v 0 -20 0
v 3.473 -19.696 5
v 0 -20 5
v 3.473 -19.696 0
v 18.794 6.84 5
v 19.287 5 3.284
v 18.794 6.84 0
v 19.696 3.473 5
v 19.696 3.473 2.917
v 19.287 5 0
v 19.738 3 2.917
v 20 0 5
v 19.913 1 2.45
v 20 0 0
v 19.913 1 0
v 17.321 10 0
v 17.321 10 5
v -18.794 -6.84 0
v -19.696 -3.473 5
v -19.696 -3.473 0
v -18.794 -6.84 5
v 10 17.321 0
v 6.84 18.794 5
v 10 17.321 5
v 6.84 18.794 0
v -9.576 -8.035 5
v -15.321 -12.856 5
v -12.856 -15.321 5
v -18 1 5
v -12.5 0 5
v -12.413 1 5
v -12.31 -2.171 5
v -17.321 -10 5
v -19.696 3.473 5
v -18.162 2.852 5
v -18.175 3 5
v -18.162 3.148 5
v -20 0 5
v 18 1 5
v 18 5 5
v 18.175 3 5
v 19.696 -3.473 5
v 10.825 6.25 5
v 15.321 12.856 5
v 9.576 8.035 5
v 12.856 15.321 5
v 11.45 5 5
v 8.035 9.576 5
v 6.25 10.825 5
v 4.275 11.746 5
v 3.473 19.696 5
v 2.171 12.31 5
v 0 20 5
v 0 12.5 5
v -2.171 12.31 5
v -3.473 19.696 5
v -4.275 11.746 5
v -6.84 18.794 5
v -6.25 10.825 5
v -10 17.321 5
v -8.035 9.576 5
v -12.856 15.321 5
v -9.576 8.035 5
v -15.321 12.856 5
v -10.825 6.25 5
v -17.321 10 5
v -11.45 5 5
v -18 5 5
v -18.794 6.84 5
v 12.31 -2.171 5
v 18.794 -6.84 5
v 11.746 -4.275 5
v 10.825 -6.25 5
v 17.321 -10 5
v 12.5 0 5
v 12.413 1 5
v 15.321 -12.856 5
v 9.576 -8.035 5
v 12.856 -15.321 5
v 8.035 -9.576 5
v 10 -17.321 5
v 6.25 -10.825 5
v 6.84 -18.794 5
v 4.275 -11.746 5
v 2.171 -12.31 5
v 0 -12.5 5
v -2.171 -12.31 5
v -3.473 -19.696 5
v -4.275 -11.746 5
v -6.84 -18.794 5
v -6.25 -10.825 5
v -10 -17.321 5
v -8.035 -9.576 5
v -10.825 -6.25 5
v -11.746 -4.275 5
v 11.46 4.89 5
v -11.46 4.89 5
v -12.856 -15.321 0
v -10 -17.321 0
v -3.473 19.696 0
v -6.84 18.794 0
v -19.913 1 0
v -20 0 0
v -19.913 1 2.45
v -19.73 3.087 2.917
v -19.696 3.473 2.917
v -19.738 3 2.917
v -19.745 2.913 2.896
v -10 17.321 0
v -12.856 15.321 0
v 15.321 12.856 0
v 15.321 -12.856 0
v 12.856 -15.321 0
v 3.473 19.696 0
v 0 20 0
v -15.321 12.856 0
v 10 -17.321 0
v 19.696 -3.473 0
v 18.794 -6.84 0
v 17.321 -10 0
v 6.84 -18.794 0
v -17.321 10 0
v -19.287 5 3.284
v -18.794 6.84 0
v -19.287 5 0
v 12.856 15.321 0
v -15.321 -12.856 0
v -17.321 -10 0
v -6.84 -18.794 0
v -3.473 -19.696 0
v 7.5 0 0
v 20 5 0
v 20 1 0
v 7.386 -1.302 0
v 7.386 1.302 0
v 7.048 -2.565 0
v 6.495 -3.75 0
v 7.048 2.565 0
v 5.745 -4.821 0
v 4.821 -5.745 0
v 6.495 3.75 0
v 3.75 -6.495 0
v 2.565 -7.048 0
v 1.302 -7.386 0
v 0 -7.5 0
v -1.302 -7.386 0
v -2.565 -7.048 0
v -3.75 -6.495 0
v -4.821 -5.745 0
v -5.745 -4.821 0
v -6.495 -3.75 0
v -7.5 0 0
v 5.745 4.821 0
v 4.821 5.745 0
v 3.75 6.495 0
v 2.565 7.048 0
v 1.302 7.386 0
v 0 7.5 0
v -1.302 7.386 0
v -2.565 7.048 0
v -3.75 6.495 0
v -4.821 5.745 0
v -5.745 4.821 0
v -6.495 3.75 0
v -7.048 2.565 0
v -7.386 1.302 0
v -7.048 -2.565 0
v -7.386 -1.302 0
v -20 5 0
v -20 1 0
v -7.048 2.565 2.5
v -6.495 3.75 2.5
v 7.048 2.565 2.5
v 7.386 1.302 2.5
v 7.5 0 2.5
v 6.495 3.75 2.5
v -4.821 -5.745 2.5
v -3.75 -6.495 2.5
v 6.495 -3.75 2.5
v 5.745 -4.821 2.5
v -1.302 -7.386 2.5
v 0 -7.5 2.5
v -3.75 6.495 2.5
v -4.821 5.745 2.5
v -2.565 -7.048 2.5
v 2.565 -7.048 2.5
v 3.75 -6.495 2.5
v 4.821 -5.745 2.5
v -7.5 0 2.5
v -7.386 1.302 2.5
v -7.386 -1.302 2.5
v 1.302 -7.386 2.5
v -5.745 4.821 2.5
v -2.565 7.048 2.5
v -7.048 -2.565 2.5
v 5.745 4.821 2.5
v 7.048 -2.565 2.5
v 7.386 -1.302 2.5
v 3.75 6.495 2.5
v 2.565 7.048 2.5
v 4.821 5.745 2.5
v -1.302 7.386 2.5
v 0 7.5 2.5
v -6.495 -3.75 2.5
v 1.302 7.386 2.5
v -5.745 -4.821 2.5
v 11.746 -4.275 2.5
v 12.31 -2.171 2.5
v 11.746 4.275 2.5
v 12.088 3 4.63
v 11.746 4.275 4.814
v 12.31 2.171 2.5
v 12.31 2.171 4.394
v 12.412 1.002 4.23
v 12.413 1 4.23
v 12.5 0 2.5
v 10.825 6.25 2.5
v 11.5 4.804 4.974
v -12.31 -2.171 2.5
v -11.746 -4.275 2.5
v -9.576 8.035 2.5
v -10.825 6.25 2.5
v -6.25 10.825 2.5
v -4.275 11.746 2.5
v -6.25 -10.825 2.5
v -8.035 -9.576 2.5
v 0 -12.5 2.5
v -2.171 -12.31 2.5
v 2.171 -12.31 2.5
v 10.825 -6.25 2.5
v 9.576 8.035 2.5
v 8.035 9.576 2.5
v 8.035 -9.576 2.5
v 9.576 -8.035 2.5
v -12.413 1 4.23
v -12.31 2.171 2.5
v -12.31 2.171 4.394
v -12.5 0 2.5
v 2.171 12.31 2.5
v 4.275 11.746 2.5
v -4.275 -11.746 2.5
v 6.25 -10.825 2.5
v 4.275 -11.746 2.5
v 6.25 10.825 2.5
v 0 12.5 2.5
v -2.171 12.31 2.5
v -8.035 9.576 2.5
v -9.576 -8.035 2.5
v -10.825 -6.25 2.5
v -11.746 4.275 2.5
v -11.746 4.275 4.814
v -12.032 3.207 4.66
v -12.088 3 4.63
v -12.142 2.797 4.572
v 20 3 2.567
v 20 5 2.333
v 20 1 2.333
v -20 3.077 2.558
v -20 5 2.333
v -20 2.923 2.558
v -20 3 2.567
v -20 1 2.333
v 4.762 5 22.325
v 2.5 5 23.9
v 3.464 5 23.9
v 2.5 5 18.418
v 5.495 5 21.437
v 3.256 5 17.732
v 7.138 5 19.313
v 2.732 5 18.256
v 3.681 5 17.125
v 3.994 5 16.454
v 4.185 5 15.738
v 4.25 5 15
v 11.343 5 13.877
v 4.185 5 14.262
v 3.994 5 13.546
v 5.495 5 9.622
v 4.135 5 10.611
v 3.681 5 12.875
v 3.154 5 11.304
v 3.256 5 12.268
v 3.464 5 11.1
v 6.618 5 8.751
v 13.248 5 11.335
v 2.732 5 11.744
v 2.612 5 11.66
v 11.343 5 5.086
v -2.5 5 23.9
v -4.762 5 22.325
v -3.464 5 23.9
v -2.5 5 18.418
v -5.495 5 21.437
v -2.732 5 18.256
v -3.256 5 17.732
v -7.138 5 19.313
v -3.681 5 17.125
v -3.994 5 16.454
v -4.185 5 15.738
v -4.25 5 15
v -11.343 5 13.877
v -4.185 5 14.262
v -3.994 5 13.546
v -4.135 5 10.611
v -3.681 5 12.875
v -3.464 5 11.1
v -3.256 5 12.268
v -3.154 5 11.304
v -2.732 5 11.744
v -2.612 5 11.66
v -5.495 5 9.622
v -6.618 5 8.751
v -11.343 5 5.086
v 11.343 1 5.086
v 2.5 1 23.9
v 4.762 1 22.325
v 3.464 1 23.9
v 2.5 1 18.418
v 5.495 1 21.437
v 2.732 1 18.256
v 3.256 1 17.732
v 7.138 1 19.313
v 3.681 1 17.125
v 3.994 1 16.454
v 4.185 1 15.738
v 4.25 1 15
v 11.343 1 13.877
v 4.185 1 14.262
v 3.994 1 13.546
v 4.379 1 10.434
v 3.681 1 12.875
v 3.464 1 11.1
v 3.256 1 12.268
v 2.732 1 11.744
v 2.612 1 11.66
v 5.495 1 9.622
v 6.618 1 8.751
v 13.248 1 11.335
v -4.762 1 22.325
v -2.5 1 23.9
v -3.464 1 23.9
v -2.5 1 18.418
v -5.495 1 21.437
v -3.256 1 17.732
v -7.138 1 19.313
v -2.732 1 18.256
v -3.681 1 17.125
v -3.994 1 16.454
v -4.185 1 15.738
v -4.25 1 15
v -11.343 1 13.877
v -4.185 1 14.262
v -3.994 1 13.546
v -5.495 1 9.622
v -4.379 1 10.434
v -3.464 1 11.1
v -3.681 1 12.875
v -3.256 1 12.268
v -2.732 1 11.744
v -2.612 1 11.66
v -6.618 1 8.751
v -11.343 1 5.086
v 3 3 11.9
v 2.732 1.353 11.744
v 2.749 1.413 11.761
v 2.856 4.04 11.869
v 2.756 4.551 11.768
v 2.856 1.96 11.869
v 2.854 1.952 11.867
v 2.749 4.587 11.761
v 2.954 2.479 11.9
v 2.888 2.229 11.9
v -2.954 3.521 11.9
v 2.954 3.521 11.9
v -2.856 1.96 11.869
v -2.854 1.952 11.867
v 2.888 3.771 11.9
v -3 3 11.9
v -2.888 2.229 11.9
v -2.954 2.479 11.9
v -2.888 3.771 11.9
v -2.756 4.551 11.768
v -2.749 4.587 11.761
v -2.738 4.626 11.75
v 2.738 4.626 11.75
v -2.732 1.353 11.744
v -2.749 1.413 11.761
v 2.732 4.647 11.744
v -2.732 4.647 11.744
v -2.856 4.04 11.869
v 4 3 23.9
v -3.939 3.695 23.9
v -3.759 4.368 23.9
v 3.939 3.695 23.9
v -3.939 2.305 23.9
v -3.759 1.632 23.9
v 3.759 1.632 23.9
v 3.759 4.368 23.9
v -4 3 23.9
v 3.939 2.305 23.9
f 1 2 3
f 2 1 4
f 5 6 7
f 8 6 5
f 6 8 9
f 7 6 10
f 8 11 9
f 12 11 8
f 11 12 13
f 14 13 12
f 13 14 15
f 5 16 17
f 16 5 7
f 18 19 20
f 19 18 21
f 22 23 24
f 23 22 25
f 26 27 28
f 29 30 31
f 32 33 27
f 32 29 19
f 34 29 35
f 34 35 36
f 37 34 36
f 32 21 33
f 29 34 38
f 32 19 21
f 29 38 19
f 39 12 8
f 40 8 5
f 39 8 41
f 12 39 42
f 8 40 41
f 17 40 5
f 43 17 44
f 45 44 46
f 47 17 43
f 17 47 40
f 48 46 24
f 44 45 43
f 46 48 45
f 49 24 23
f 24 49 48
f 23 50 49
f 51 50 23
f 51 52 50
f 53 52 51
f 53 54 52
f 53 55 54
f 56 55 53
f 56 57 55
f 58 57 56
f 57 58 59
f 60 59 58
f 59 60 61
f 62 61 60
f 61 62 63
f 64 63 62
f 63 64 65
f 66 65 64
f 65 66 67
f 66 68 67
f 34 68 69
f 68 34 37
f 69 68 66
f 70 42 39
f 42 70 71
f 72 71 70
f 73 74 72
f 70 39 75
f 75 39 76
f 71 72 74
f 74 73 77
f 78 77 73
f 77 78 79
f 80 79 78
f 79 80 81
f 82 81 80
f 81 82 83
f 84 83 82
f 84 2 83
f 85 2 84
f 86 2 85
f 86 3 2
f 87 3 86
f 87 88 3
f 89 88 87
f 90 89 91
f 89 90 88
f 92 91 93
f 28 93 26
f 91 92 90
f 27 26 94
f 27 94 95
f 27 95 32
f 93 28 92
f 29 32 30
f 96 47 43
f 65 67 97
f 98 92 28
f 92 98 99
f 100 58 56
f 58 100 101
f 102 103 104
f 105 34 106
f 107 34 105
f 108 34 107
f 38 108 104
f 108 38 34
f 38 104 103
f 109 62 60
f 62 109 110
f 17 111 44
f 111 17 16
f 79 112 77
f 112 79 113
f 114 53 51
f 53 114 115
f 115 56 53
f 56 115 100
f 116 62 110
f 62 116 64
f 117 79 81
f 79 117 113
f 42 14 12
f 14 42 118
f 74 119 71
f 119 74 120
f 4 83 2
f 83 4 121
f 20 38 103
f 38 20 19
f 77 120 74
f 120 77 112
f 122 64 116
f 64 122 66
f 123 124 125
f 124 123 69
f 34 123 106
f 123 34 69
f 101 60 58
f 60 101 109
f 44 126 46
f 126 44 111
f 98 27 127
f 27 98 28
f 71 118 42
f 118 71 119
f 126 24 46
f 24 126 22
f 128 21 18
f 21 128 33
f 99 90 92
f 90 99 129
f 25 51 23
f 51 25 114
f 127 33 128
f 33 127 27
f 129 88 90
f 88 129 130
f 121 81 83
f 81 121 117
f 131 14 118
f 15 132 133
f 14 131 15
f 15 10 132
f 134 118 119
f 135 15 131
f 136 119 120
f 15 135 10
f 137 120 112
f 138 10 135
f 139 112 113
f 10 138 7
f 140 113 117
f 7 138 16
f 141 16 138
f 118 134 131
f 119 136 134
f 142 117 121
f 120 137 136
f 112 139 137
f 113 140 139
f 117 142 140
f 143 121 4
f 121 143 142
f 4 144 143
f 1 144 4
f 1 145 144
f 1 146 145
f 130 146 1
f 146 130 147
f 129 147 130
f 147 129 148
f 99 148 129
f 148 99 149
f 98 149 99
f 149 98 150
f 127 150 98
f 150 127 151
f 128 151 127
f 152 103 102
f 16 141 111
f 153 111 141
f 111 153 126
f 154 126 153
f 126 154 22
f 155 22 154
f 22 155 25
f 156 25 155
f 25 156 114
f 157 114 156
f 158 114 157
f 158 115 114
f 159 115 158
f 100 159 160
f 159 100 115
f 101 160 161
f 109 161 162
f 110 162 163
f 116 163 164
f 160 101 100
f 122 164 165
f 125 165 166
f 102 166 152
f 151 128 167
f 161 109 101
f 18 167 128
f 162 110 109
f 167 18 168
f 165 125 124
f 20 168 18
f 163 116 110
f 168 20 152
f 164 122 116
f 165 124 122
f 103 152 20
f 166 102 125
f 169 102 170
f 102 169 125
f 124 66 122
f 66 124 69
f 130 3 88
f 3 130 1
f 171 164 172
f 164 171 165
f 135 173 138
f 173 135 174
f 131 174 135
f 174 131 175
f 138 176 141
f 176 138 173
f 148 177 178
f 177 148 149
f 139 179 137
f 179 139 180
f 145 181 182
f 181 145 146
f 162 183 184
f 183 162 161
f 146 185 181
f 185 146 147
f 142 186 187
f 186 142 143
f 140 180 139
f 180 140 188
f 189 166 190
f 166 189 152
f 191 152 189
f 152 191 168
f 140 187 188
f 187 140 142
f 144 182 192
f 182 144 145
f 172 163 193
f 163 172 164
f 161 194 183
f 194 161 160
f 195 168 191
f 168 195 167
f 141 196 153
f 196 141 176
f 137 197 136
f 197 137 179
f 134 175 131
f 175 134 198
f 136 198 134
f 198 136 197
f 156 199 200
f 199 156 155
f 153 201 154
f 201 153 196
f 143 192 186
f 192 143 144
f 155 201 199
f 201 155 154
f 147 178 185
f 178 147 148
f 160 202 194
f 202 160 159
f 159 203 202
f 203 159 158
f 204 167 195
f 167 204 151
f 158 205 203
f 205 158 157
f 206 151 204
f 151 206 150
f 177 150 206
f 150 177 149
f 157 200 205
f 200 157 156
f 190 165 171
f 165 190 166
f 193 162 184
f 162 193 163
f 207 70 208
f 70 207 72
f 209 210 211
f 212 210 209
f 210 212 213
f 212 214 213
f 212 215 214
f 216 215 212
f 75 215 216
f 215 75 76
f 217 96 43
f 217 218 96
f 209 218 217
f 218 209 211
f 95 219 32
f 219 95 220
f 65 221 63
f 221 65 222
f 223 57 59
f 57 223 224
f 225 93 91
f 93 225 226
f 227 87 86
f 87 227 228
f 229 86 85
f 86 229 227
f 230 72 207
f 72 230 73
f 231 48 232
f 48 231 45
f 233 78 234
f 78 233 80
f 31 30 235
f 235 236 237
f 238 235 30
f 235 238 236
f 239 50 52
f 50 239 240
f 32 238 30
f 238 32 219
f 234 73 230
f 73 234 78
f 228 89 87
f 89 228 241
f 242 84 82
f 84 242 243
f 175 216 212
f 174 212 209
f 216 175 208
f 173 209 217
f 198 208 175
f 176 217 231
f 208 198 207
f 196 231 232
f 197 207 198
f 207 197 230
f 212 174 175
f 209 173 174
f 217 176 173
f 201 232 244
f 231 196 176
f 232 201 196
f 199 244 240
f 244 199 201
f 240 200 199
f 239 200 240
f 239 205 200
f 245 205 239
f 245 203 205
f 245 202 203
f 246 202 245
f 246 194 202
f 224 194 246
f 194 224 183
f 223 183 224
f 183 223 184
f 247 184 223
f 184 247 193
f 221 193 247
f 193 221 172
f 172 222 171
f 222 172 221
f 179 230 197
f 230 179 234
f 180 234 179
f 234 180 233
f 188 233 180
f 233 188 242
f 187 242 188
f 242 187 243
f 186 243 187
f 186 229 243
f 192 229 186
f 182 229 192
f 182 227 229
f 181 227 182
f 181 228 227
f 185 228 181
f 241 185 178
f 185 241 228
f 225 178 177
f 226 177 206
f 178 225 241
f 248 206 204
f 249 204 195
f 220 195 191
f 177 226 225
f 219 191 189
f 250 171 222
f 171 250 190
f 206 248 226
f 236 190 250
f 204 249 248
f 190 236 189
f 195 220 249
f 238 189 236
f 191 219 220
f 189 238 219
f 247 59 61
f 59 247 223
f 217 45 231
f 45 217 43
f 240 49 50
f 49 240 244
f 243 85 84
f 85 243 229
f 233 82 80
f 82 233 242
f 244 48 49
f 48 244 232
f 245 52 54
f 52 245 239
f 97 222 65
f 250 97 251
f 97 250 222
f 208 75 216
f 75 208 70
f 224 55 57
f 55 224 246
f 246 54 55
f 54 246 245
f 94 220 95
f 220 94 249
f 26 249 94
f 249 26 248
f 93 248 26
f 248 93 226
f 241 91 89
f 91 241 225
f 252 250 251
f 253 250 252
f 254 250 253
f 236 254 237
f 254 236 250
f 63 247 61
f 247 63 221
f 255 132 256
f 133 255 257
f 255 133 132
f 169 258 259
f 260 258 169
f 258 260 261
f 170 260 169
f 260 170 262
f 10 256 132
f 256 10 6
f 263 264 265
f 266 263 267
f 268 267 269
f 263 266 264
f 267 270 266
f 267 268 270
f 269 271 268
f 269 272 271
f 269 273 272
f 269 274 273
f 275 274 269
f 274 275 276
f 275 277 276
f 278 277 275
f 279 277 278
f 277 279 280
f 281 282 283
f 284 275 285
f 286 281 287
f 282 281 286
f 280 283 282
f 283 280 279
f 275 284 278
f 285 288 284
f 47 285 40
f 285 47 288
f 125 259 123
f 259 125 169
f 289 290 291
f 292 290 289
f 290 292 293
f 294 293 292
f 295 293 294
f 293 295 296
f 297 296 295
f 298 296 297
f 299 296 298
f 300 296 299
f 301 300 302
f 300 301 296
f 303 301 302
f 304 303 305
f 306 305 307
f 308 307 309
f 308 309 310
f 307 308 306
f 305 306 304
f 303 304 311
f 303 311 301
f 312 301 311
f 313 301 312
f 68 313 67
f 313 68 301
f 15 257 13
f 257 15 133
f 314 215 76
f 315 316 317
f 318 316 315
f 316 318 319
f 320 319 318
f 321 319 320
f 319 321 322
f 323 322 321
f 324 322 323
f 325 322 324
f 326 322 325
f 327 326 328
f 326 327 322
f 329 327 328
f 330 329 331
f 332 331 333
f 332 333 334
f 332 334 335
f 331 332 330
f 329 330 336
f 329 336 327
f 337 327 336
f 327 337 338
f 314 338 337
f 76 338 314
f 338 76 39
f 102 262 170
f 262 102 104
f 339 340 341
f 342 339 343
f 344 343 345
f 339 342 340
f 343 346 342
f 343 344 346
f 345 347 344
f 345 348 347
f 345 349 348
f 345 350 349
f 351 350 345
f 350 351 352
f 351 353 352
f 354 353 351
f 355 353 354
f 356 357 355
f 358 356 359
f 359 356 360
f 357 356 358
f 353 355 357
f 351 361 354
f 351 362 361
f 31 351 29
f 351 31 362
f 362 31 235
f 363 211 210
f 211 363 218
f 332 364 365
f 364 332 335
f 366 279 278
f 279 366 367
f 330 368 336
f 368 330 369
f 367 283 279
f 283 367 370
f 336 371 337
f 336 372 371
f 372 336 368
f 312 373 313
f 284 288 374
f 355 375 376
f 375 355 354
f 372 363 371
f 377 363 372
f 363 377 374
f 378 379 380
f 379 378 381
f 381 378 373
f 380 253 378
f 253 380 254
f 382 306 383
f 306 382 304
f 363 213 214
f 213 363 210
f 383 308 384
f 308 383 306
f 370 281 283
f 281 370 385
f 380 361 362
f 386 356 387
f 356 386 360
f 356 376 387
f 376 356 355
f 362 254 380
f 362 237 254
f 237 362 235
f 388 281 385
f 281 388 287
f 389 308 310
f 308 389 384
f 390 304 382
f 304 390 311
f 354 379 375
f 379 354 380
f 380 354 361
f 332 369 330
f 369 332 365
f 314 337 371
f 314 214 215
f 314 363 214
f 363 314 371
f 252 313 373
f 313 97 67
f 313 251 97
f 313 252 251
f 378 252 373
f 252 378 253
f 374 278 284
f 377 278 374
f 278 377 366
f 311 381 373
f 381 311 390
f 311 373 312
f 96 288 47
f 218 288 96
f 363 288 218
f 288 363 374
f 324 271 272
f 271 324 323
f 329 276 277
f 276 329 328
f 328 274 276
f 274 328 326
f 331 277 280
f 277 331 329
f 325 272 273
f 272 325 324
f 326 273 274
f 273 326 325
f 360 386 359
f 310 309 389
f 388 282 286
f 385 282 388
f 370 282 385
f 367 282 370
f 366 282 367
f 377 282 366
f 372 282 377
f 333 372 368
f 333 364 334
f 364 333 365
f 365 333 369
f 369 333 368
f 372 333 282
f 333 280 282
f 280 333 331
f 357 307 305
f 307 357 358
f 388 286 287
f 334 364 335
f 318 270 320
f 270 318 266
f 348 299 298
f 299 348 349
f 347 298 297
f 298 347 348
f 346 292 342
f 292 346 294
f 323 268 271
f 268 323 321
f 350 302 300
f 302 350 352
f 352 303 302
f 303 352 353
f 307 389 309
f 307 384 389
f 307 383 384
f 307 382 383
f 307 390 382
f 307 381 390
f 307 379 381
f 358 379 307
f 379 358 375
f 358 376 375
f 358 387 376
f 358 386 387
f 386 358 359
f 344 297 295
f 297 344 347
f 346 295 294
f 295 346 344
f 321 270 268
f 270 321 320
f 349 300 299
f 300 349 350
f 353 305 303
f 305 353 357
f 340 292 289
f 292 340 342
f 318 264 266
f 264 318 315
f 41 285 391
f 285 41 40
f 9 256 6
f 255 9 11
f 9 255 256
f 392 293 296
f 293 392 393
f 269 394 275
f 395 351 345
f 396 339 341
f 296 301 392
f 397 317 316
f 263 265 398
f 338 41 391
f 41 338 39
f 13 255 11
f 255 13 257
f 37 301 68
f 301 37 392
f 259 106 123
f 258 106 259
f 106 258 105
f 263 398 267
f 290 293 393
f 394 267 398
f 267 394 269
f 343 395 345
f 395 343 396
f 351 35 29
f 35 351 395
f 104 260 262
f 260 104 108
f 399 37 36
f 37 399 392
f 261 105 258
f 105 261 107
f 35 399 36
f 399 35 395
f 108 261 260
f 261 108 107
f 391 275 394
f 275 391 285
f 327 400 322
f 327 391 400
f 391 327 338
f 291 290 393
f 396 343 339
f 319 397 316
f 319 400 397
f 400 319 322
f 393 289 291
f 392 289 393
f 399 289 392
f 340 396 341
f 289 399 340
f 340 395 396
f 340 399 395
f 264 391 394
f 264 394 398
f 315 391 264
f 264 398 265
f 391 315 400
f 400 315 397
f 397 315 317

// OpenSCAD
//---------------------------------------------------------------------------------------------
//-- Printable holder for washer
//-- (c) Martin Korinek	m.ko@inode.at
//-- Jan-2015
//---------------------------------------------------------------------------------------------
//--
//---------------------------------------------------------------------------------------------

//fragment minimum angle
  $fa=10.0;

//fragment minimum size
  $fs=0.5;

  diameter = 40;
  hold_hight = 12;
union()
{
	{ 
		//Washer holder
		difference()
		{  
			cylinder(h = 5, d = diameter);
			translate([0,0,-1])
				cylinder(h = 6, d = 15);
			translate([0,0,2.5])
				cylinder(h = 3, d = 25);
		}


		translate([-diameter/2,1,0])
		
		intersection()
		{
			difference()
			{
				//main part of holder
				cube(size = [diameter,4,hold_hight+12]);
				//inner hole
				translate([diameter/2,2,-0.1])	
					cylinder(h = hold_hight, r1= diameter/2-2, r2 = 3);
				//middle round hole
				translate([diameter/2,-1,hold_hight+3])
					rotate([-90,0,0])
						cylinder(h = hold_hight-2, d = 8.5);
				//upper hole
				translate([diameter/2,-1,28])
					rotate([-90,0,0])
						cube(size = [5,20,20], center = true);
			}
			//outer boarder
			translate([diameter/2,2,-0.1])	
			cylinder(h = hold_hight+12, r1= diameter/2+2, r2 = 4);
			
			
		}
		
	}
	//cylinder(h = 50, d = diameter);
}
	//	cylinder(h = 28, r1= diameter, r2 = diameter/2);
